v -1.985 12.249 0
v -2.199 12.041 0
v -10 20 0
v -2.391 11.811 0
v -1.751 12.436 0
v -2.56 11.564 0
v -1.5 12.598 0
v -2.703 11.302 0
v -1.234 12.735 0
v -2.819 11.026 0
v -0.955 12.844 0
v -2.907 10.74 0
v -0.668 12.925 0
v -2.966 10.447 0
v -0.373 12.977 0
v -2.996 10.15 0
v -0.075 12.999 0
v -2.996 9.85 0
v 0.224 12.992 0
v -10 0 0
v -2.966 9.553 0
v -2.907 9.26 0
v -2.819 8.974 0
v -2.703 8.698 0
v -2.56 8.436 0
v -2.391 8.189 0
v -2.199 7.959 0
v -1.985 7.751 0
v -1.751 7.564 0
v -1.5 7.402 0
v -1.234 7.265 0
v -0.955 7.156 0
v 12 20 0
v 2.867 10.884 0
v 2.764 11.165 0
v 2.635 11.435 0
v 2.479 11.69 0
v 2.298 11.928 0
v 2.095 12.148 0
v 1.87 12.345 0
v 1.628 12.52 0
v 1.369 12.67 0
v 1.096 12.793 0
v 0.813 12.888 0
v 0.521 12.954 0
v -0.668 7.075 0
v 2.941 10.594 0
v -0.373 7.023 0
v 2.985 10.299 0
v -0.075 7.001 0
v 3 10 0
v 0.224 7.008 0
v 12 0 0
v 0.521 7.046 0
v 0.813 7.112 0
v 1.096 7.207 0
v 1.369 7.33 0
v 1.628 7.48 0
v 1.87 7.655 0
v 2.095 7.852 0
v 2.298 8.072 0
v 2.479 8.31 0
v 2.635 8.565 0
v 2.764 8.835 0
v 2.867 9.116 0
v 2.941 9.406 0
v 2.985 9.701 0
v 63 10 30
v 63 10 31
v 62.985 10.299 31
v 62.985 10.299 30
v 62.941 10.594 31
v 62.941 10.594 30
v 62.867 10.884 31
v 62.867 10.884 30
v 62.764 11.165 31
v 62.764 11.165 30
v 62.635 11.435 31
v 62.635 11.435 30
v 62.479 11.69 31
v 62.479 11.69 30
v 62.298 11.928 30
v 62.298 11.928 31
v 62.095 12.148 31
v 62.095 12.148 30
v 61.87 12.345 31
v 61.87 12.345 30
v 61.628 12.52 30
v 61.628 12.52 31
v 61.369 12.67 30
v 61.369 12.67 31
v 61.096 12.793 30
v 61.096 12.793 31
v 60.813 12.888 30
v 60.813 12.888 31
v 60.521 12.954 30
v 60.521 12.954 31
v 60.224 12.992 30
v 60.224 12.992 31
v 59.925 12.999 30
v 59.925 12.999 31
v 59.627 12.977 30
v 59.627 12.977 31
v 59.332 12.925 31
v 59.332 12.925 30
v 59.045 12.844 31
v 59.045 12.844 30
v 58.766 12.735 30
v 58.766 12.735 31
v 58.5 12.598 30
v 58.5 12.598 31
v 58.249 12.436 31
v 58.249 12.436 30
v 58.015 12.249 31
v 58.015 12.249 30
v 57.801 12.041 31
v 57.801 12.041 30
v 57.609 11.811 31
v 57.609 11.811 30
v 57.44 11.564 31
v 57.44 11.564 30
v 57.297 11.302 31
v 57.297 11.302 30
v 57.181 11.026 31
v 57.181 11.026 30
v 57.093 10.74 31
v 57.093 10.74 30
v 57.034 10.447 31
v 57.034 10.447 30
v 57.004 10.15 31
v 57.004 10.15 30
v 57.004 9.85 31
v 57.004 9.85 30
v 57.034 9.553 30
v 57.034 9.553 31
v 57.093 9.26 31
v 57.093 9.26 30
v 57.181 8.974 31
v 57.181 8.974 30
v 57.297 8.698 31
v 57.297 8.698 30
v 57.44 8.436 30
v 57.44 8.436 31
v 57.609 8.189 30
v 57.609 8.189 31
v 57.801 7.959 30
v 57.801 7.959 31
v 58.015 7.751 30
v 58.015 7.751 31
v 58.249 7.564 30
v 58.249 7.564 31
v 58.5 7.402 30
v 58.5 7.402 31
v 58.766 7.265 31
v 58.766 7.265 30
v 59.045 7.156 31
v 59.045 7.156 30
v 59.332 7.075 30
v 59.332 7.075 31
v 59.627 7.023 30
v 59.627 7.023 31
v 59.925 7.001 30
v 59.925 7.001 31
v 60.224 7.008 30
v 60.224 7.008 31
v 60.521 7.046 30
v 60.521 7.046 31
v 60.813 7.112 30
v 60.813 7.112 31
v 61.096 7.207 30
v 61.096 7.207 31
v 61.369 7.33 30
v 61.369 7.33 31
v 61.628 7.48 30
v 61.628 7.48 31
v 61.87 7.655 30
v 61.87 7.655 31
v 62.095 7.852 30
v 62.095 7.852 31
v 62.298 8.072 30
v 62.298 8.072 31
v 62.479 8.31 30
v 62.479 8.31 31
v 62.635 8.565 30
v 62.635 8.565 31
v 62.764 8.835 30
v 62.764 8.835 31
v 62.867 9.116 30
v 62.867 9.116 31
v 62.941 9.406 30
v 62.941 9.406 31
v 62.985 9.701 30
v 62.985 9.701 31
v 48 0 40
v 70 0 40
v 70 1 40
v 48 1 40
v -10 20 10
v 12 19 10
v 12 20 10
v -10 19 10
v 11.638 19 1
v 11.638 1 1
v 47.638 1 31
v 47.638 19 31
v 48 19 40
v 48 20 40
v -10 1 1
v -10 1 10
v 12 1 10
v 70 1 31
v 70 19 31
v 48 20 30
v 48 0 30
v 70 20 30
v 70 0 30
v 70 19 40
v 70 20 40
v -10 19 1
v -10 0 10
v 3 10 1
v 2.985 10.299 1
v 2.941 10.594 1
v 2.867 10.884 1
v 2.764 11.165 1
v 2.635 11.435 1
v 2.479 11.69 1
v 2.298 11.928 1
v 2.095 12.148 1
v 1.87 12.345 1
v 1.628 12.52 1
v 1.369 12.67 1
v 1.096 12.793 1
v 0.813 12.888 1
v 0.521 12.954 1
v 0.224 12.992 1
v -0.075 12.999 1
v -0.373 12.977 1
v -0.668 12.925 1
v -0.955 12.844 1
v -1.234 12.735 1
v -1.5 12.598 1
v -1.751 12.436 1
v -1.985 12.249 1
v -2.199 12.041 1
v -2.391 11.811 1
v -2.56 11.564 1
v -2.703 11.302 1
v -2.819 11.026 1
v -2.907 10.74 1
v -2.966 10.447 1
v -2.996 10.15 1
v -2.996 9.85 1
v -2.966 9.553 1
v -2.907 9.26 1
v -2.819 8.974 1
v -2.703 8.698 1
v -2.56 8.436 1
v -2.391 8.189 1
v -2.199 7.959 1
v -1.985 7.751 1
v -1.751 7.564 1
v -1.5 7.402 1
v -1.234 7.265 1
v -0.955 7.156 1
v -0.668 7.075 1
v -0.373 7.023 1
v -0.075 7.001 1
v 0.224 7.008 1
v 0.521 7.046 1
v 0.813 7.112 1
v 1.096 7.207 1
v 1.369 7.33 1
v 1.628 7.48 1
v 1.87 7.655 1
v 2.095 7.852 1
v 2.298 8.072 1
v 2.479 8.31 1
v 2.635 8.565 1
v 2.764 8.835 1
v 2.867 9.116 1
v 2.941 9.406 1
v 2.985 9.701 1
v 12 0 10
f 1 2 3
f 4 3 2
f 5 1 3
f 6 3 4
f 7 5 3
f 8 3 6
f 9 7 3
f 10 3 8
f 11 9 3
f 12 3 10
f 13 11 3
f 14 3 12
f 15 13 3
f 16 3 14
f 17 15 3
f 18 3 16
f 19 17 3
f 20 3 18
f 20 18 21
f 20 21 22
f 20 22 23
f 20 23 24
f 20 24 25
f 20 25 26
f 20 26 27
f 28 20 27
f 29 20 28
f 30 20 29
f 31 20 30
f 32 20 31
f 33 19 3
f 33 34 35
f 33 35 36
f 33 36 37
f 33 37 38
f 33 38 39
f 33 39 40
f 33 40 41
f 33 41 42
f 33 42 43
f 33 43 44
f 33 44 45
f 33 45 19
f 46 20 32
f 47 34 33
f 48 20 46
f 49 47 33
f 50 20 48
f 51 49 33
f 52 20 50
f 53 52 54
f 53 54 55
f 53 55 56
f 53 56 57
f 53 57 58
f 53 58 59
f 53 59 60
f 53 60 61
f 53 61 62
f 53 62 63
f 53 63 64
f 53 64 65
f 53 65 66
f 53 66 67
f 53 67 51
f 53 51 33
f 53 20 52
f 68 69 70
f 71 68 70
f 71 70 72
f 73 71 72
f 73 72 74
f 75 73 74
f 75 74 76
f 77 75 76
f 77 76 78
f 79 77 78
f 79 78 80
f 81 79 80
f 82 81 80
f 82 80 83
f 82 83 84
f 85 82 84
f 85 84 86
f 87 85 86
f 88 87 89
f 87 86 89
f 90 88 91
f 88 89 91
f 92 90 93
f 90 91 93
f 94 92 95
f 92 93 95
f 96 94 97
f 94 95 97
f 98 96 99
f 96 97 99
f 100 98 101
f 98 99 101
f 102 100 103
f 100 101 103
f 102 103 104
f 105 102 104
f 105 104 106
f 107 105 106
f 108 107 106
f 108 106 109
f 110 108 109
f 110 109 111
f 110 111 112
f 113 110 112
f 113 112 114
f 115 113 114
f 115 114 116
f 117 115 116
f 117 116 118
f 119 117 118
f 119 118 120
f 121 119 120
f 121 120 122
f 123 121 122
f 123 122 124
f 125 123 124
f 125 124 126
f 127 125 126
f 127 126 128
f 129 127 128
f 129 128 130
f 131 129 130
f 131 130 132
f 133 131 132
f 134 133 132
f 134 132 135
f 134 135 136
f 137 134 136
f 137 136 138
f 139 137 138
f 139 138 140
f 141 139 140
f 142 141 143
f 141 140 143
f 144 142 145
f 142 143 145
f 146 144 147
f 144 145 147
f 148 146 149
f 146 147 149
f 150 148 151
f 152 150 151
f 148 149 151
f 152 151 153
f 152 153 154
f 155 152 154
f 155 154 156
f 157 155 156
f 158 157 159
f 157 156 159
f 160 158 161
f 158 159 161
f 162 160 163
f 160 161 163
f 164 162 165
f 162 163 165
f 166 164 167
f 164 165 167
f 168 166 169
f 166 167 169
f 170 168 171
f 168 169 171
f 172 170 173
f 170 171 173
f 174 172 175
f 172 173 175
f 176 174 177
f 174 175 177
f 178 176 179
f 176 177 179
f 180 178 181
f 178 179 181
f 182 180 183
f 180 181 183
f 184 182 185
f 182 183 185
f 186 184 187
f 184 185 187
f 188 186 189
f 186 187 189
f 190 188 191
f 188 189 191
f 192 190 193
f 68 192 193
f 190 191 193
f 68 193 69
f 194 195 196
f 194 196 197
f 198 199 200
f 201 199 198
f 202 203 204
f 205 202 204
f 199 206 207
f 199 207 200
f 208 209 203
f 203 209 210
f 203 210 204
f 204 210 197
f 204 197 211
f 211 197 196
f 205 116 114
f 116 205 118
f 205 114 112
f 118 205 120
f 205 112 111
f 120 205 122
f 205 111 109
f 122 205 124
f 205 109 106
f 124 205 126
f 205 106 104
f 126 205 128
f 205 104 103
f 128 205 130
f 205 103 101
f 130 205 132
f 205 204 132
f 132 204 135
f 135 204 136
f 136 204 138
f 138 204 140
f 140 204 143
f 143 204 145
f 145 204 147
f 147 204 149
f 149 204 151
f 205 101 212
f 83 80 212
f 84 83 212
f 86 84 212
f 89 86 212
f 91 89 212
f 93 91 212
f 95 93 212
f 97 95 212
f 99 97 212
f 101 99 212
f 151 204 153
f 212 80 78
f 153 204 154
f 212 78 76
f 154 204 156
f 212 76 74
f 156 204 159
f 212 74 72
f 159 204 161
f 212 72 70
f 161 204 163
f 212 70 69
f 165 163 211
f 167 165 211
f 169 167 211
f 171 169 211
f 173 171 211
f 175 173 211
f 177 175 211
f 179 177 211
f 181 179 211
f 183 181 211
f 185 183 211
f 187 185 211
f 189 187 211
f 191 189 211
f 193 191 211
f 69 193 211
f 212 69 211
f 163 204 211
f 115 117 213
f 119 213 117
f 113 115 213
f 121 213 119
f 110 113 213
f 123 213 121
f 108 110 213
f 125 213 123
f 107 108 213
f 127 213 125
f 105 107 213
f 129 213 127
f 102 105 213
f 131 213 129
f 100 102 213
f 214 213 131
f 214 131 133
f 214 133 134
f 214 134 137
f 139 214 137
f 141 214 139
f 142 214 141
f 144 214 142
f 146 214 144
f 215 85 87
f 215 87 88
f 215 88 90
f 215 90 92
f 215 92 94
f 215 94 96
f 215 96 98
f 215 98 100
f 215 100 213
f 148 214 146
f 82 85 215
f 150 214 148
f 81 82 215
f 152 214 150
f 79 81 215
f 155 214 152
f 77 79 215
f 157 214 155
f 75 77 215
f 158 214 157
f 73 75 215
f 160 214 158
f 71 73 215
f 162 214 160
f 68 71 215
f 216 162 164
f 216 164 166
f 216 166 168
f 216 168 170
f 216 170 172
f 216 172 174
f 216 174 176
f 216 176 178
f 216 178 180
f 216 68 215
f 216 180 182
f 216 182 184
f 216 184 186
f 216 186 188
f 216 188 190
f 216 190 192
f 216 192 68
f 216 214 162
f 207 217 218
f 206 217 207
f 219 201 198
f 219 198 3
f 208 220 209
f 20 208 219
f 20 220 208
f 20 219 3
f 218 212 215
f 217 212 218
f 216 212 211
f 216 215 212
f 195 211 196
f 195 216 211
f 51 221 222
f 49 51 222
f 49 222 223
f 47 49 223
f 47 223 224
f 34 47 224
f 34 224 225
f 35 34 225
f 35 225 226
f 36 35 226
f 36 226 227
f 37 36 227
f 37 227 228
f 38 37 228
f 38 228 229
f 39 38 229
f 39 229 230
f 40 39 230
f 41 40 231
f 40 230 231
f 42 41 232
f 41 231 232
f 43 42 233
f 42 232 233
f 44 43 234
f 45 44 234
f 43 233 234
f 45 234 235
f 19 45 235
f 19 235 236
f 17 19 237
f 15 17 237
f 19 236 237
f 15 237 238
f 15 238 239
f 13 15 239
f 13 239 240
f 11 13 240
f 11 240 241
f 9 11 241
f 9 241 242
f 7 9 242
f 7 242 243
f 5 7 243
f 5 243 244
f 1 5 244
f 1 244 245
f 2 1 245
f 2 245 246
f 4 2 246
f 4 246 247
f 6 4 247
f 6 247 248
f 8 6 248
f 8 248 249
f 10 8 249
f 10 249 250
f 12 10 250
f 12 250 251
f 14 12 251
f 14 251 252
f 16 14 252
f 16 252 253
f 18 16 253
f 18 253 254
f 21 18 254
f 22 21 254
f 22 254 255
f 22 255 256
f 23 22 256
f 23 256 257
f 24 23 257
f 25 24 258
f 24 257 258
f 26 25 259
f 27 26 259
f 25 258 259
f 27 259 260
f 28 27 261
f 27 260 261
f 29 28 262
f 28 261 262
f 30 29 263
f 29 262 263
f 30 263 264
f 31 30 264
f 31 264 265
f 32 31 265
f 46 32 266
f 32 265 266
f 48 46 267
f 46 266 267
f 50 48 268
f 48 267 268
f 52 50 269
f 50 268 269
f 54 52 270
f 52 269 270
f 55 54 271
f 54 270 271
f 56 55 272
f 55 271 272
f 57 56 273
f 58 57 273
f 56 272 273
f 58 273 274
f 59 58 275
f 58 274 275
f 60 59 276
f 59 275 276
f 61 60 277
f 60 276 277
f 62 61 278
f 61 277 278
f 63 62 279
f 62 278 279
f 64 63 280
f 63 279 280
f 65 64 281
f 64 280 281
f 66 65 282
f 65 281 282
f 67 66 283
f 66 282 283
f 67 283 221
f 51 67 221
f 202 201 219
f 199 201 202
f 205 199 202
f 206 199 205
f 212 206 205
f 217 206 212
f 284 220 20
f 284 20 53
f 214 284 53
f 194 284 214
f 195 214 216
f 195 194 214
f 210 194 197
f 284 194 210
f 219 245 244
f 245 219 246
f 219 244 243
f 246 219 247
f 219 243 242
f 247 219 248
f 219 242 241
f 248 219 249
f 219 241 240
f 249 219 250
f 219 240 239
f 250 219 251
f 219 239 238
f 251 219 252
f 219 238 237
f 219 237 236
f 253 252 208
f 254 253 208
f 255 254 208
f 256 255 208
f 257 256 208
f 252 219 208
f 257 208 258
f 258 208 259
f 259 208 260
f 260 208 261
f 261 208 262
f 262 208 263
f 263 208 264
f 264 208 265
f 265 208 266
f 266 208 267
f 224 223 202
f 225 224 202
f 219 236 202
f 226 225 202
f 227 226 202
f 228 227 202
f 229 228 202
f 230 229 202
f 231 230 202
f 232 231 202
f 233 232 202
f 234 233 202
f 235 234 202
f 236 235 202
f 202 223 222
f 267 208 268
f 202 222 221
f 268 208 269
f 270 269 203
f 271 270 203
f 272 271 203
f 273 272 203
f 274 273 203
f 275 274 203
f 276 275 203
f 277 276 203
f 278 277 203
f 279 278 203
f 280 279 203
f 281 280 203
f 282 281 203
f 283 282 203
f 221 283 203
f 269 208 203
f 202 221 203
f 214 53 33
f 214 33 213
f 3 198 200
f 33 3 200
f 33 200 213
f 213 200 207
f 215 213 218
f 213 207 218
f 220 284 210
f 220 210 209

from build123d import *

# Parameters (mm, degrees)
F1_DEPTH = 20
F2_T     = -1
F3_R     = 3
F4_DEPTH = 1.001
F5_R     = 3
F6_DEPTH = 31.001


with BuildPart() as f1:
    # F0 (on Front) → F1 (new body)
    with BuildSketch(Plane.XZ):
        Polygon((70, 30), (70, 40), (48, 40), (12, 10), (-10, 10), (-10, 0), (12, 0), (48, 30), align=None)
    extrude(amount=-F1_DEPTH)

    # F2
    f2_openings = [f1.faces().sort_by_distance(p)[0] for p in [
        (59, 10, 40),
        (30, 10, 25),
        (1, 10, 10),
        (70, 10, 35),
        (-10, 10, 5),
    ]]
    offset(amount=F2_T, openings=f2_openings, kind=Kind.INTERSECTION)

    # F3 (on face) → F4 (cut, through all)
    with BuildSketch(Plane.XY.offset(1)):
        with Locations((0, 10)):
            Circle(F3_R)
    extrude(amount=-F4_DEPTH, mode=Mode.SUBTRACT)

    # F5 (on face) → F6 (cut, through all)
    with BuildSketch(Plane.XY.offset(31)):
        with Locations((60, 10)):
            Circle(F5_R)
    extrude(amount=-F6_DEPTH, mode=Mode.SUBTRACT)


solid = f1.part
